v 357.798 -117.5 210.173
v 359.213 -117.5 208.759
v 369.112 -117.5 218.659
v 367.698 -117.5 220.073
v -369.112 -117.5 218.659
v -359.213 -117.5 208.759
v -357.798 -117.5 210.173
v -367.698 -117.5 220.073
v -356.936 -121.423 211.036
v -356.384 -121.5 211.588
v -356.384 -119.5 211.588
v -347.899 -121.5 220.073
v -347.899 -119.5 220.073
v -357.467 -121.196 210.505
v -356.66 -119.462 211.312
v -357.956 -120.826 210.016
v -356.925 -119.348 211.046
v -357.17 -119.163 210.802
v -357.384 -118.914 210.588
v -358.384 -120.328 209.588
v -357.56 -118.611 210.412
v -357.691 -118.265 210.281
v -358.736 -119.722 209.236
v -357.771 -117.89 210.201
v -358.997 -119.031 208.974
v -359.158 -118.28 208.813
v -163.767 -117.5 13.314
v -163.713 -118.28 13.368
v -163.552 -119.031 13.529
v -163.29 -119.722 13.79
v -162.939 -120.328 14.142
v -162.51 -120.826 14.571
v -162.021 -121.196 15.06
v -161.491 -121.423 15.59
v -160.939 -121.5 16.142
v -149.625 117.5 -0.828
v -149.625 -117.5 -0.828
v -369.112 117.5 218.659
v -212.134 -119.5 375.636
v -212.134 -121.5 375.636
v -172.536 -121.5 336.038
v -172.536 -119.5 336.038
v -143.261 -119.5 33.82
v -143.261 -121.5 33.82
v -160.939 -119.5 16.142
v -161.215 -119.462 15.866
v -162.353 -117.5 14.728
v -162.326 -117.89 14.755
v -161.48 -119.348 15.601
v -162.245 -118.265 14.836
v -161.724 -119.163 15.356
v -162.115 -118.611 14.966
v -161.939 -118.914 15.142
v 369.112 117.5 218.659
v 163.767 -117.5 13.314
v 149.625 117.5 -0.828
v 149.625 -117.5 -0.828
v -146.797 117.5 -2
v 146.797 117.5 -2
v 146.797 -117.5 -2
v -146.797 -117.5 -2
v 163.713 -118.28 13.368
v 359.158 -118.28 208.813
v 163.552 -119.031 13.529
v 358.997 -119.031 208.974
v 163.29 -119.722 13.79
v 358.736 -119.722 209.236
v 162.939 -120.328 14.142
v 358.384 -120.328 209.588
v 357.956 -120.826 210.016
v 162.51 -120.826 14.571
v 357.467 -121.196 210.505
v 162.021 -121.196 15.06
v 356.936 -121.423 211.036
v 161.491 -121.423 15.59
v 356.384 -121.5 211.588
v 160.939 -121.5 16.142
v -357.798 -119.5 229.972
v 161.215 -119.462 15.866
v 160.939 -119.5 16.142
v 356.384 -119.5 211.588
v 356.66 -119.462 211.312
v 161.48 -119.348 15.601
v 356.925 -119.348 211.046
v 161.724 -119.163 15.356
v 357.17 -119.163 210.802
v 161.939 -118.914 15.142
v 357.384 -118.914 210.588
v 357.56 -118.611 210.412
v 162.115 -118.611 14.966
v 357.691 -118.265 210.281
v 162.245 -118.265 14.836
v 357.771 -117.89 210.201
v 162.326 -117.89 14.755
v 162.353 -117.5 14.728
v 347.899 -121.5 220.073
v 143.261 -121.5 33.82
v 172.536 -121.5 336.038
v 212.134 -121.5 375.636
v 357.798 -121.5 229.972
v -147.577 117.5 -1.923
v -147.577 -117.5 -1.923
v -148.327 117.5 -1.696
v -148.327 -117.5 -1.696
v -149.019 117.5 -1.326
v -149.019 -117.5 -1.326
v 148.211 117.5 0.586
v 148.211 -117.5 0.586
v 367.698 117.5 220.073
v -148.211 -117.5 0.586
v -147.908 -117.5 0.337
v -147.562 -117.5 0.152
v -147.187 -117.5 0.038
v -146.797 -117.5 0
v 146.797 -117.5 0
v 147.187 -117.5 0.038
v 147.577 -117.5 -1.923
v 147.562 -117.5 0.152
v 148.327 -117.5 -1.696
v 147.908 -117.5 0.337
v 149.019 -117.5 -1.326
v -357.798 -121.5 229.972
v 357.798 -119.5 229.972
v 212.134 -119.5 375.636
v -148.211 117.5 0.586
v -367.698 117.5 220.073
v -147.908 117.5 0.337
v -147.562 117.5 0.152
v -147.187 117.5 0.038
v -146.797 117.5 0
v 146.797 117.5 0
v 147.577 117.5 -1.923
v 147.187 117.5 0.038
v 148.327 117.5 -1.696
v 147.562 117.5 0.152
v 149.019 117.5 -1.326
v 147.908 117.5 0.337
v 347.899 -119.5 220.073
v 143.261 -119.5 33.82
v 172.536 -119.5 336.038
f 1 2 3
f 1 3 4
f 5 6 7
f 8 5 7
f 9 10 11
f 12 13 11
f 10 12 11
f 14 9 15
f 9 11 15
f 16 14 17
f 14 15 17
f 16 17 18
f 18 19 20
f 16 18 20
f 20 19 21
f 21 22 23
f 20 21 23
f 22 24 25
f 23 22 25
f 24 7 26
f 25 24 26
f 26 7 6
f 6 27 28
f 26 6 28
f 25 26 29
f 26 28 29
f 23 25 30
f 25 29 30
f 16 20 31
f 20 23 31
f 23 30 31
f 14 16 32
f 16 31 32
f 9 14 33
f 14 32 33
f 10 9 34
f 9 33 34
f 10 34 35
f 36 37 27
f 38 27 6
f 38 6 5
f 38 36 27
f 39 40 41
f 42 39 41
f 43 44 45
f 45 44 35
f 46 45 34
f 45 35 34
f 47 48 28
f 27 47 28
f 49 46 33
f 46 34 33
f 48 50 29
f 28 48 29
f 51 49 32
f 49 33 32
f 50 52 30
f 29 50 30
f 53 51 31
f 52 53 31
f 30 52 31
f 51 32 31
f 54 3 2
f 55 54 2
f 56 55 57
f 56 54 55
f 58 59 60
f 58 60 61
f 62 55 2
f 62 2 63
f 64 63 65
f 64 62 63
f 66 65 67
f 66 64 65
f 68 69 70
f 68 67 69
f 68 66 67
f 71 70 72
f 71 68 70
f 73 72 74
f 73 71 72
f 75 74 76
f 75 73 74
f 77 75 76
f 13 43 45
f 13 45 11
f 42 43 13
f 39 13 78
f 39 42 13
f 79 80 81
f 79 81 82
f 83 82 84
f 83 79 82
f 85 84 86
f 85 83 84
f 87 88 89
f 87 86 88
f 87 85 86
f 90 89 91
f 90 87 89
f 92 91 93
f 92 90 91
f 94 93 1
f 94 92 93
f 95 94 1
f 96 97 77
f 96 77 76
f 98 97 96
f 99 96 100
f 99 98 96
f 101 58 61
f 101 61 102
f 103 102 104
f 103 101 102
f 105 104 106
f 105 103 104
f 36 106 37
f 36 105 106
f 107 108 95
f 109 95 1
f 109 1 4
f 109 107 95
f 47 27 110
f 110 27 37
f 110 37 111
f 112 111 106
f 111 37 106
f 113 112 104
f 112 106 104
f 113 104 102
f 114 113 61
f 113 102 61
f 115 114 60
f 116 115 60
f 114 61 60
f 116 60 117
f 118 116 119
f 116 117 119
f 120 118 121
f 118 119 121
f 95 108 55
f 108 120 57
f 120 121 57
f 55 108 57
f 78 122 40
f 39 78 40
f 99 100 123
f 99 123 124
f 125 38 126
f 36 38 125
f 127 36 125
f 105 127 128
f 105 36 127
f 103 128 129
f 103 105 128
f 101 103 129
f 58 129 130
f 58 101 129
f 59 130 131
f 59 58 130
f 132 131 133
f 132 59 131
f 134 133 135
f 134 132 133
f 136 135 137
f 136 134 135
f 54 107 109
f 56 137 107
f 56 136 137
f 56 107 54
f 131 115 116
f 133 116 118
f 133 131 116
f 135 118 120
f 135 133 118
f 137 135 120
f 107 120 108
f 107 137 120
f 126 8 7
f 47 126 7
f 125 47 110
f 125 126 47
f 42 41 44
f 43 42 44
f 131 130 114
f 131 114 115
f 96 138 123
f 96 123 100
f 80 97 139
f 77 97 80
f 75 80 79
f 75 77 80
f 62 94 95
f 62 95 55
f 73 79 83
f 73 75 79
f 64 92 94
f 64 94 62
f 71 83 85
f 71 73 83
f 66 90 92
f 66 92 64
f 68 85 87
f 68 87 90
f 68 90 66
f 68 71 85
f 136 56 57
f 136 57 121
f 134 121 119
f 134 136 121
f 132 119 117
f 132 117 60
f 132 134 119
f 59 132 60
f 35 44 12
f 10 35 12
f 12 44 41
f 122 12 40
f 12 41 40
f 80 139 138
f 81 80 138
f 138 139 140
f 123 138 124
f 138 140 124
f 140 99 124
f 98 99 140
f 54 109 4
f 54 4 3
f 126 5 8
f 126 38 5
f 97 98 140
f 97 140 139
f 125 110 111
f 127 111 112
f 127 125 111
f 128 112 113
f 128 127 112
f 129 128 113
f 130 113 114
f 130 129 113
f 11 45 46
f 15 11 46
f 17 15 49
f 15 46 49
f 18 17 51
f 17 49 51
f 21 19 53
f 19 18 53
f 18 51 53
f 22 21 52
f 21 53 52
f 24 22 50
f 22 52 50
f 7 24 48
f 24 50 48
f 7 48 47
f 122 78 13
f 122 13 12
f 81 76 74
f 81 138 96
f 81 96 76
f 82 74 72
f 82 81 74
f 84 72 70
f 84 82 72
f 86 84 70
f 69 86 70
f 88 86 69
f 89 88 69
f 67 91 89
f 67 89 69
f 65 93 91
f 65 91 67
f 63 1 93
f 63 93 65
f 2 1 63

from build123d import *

# Parameters (mm, degrees)
SM_BASE_FLANGE_1_DEPTH      = 117.5
SM_EDGE_FLANGE_1_DEPTH      = 290.401572875
SM_START                    = 2
SM_EDGE_FLANGE_1_FLAT_DEPTH = 2
CUT_EXTRUDE_START           = -14
CUT_EXTRUDE_2_DEPTH         = 14


# Read off the part's stored shape, not the designer's step: 切除-拉伸2
# Sheet-metal steps are written as plain solids
with BuildPart() as part:
    # Sketch 1 → 基体-法兰1 (new, symmetric)
    with BuildSketch(Plane(origin=(0, 0, 0), x_dir=(1, 0, 0), z_dir=(0, 1, 0))):
        with BuildLine():
            Line((-367.697843509, -220.072843509), (-148.210786438, -0.585786438))
            ThreePointArc((-148.210786438, -0.585786438), (-147.56193974, -0.152240935), (-146.796572875, 0))
            Line((-146.796572875, 0), (146.796572875, 0))
            ThreePointArc((146.796572875, 0), (147.56193974, -0.152240935), (148.210786438, -0.585786438))
            Line((148.210786438, -0.585786438), (367.697843509, -220.072843509))
            Line((367.697843509, -220.072843509), (369.112057071, -218.658629946))
            Line((369.112057071, -218.658629946), (149.625, 0.828427125))
            ThreePointArc((149.625, 0.828427125), (148.327306605, 1.69551813), (146.796572875, 2))
            Line((146.796572875, 2), (-146.796572875, 2))
            ThreePointArc((-146.796572875, 2), (-148.327306605, 1.69551813), (-149.625, 0.828427125))
            Line((-149.625, 0.828427125), (-369.112057071, -218.658629946))
            Line((-369.112057071, -218.658629946), (-367.697843509, -220.072843509))
        make_face()
    extrude(amount=SM_BASE_FLANGE_1_DEPTH, both=True)

    # 边线-法兰1 bend section (across the edge) → 边线-法兰1 (add)
    with BuildSketch(Plane(origin=(162.352922061, -119.5, 14.727922061), x_dir=(0, 1, 0), z_dir=(0.7071067811865512, 0, 0.7071067811865439))):
        with BuildLine():
            Line((-2, 2), (0, 2))
            ThreePointArc((0, 2), (0.585786438, 0.585786438), (2, 0))
            Line((2, 0), (2, -2))
            ThreePointArc((2, -2), (-0.828427125, -0.828427125), (-2, 2))
        make_face()
    sm_edge_flange_1 = extrude(amount=SM_EDGE_FLANGE_1_DEPTH)

    # 边线-法兰1 profile (on flange) → 边线-法兰1 flat (add)
    with BuildSketch(Plane(origin=(73.8125, -119.5, -73.8125), x_dir=(0.7071067811865512, 0, 0.7071067811865439), z_dir=(0, -1, 0)).offset(SM_START)):
        Polygon((359.616638573, 220), (125.215065697, 27), (125.215065697, 2), (415.616638573, 2), (415.616638573, 220), align=None)
    sm_edge_flange_1_flat = extrude(amount=-SM_EDGE_FLANGE_1_FLAT_DEPTH)

    # 切除-拉伸2 outline → 切除-拉伸2 (cut)
    with BuildSketch(Plane(origin=(293.885343509, 0, 293.885343509), x_dir=(0.7071067811865338, 0, -0.7071067811865613), z_dir=(0.7071067811865613, 0, 0.7071067811865338)).offset(CUT_EXTRUDE_START)):
        with BuildLine():
            ThreePointArc((102.386638573, -121.5), (105.215065697, -120.328427125), (106.386638573, -117.5))
            Line((106.386638573, -117.5), (104.386638573, -117.5))
            ThreePointArc((104.386638573, -117.5), (103.800852135, -118.914213562), (102.386638573, -119.5))
            Line((102.386638573, -119.5), (90.386638573, -119.5))
            Line((90.386638573, -119.5), (90.386638573, -121.5))
            Line((90.386638573, -121.5), (102.386638573, -121.5))
        make_face()
    cut_extrude_2 = extrude(amount=CUT_EXTRUDE_2_DEPTH, mode=Mode.SUBTRACT)

    # 镜向1: 边线-法兰1, 边线-法兰1 flat, 切除-拉伸2 across plane
    add(sm_edge_flange_1.mirror(Plane(origin=(0, 0, 0), x_dir=(0, 0, 1), z_dir=(1, 0, 0))))
    add(sm_edge_flange_1_flat.mirror(Plane(origin=(0, 0, 0), x_dir=(0, 0, 1), z_dir=(1, 0, 0))))
    add(cut_extrude_2.mirror(Plane(origin=(0, 0, 0), x_dir=(0, 0, 1), z_dir=(1, 0, 0))), mode=Mode.SUBTRACT)


solid = part.part
